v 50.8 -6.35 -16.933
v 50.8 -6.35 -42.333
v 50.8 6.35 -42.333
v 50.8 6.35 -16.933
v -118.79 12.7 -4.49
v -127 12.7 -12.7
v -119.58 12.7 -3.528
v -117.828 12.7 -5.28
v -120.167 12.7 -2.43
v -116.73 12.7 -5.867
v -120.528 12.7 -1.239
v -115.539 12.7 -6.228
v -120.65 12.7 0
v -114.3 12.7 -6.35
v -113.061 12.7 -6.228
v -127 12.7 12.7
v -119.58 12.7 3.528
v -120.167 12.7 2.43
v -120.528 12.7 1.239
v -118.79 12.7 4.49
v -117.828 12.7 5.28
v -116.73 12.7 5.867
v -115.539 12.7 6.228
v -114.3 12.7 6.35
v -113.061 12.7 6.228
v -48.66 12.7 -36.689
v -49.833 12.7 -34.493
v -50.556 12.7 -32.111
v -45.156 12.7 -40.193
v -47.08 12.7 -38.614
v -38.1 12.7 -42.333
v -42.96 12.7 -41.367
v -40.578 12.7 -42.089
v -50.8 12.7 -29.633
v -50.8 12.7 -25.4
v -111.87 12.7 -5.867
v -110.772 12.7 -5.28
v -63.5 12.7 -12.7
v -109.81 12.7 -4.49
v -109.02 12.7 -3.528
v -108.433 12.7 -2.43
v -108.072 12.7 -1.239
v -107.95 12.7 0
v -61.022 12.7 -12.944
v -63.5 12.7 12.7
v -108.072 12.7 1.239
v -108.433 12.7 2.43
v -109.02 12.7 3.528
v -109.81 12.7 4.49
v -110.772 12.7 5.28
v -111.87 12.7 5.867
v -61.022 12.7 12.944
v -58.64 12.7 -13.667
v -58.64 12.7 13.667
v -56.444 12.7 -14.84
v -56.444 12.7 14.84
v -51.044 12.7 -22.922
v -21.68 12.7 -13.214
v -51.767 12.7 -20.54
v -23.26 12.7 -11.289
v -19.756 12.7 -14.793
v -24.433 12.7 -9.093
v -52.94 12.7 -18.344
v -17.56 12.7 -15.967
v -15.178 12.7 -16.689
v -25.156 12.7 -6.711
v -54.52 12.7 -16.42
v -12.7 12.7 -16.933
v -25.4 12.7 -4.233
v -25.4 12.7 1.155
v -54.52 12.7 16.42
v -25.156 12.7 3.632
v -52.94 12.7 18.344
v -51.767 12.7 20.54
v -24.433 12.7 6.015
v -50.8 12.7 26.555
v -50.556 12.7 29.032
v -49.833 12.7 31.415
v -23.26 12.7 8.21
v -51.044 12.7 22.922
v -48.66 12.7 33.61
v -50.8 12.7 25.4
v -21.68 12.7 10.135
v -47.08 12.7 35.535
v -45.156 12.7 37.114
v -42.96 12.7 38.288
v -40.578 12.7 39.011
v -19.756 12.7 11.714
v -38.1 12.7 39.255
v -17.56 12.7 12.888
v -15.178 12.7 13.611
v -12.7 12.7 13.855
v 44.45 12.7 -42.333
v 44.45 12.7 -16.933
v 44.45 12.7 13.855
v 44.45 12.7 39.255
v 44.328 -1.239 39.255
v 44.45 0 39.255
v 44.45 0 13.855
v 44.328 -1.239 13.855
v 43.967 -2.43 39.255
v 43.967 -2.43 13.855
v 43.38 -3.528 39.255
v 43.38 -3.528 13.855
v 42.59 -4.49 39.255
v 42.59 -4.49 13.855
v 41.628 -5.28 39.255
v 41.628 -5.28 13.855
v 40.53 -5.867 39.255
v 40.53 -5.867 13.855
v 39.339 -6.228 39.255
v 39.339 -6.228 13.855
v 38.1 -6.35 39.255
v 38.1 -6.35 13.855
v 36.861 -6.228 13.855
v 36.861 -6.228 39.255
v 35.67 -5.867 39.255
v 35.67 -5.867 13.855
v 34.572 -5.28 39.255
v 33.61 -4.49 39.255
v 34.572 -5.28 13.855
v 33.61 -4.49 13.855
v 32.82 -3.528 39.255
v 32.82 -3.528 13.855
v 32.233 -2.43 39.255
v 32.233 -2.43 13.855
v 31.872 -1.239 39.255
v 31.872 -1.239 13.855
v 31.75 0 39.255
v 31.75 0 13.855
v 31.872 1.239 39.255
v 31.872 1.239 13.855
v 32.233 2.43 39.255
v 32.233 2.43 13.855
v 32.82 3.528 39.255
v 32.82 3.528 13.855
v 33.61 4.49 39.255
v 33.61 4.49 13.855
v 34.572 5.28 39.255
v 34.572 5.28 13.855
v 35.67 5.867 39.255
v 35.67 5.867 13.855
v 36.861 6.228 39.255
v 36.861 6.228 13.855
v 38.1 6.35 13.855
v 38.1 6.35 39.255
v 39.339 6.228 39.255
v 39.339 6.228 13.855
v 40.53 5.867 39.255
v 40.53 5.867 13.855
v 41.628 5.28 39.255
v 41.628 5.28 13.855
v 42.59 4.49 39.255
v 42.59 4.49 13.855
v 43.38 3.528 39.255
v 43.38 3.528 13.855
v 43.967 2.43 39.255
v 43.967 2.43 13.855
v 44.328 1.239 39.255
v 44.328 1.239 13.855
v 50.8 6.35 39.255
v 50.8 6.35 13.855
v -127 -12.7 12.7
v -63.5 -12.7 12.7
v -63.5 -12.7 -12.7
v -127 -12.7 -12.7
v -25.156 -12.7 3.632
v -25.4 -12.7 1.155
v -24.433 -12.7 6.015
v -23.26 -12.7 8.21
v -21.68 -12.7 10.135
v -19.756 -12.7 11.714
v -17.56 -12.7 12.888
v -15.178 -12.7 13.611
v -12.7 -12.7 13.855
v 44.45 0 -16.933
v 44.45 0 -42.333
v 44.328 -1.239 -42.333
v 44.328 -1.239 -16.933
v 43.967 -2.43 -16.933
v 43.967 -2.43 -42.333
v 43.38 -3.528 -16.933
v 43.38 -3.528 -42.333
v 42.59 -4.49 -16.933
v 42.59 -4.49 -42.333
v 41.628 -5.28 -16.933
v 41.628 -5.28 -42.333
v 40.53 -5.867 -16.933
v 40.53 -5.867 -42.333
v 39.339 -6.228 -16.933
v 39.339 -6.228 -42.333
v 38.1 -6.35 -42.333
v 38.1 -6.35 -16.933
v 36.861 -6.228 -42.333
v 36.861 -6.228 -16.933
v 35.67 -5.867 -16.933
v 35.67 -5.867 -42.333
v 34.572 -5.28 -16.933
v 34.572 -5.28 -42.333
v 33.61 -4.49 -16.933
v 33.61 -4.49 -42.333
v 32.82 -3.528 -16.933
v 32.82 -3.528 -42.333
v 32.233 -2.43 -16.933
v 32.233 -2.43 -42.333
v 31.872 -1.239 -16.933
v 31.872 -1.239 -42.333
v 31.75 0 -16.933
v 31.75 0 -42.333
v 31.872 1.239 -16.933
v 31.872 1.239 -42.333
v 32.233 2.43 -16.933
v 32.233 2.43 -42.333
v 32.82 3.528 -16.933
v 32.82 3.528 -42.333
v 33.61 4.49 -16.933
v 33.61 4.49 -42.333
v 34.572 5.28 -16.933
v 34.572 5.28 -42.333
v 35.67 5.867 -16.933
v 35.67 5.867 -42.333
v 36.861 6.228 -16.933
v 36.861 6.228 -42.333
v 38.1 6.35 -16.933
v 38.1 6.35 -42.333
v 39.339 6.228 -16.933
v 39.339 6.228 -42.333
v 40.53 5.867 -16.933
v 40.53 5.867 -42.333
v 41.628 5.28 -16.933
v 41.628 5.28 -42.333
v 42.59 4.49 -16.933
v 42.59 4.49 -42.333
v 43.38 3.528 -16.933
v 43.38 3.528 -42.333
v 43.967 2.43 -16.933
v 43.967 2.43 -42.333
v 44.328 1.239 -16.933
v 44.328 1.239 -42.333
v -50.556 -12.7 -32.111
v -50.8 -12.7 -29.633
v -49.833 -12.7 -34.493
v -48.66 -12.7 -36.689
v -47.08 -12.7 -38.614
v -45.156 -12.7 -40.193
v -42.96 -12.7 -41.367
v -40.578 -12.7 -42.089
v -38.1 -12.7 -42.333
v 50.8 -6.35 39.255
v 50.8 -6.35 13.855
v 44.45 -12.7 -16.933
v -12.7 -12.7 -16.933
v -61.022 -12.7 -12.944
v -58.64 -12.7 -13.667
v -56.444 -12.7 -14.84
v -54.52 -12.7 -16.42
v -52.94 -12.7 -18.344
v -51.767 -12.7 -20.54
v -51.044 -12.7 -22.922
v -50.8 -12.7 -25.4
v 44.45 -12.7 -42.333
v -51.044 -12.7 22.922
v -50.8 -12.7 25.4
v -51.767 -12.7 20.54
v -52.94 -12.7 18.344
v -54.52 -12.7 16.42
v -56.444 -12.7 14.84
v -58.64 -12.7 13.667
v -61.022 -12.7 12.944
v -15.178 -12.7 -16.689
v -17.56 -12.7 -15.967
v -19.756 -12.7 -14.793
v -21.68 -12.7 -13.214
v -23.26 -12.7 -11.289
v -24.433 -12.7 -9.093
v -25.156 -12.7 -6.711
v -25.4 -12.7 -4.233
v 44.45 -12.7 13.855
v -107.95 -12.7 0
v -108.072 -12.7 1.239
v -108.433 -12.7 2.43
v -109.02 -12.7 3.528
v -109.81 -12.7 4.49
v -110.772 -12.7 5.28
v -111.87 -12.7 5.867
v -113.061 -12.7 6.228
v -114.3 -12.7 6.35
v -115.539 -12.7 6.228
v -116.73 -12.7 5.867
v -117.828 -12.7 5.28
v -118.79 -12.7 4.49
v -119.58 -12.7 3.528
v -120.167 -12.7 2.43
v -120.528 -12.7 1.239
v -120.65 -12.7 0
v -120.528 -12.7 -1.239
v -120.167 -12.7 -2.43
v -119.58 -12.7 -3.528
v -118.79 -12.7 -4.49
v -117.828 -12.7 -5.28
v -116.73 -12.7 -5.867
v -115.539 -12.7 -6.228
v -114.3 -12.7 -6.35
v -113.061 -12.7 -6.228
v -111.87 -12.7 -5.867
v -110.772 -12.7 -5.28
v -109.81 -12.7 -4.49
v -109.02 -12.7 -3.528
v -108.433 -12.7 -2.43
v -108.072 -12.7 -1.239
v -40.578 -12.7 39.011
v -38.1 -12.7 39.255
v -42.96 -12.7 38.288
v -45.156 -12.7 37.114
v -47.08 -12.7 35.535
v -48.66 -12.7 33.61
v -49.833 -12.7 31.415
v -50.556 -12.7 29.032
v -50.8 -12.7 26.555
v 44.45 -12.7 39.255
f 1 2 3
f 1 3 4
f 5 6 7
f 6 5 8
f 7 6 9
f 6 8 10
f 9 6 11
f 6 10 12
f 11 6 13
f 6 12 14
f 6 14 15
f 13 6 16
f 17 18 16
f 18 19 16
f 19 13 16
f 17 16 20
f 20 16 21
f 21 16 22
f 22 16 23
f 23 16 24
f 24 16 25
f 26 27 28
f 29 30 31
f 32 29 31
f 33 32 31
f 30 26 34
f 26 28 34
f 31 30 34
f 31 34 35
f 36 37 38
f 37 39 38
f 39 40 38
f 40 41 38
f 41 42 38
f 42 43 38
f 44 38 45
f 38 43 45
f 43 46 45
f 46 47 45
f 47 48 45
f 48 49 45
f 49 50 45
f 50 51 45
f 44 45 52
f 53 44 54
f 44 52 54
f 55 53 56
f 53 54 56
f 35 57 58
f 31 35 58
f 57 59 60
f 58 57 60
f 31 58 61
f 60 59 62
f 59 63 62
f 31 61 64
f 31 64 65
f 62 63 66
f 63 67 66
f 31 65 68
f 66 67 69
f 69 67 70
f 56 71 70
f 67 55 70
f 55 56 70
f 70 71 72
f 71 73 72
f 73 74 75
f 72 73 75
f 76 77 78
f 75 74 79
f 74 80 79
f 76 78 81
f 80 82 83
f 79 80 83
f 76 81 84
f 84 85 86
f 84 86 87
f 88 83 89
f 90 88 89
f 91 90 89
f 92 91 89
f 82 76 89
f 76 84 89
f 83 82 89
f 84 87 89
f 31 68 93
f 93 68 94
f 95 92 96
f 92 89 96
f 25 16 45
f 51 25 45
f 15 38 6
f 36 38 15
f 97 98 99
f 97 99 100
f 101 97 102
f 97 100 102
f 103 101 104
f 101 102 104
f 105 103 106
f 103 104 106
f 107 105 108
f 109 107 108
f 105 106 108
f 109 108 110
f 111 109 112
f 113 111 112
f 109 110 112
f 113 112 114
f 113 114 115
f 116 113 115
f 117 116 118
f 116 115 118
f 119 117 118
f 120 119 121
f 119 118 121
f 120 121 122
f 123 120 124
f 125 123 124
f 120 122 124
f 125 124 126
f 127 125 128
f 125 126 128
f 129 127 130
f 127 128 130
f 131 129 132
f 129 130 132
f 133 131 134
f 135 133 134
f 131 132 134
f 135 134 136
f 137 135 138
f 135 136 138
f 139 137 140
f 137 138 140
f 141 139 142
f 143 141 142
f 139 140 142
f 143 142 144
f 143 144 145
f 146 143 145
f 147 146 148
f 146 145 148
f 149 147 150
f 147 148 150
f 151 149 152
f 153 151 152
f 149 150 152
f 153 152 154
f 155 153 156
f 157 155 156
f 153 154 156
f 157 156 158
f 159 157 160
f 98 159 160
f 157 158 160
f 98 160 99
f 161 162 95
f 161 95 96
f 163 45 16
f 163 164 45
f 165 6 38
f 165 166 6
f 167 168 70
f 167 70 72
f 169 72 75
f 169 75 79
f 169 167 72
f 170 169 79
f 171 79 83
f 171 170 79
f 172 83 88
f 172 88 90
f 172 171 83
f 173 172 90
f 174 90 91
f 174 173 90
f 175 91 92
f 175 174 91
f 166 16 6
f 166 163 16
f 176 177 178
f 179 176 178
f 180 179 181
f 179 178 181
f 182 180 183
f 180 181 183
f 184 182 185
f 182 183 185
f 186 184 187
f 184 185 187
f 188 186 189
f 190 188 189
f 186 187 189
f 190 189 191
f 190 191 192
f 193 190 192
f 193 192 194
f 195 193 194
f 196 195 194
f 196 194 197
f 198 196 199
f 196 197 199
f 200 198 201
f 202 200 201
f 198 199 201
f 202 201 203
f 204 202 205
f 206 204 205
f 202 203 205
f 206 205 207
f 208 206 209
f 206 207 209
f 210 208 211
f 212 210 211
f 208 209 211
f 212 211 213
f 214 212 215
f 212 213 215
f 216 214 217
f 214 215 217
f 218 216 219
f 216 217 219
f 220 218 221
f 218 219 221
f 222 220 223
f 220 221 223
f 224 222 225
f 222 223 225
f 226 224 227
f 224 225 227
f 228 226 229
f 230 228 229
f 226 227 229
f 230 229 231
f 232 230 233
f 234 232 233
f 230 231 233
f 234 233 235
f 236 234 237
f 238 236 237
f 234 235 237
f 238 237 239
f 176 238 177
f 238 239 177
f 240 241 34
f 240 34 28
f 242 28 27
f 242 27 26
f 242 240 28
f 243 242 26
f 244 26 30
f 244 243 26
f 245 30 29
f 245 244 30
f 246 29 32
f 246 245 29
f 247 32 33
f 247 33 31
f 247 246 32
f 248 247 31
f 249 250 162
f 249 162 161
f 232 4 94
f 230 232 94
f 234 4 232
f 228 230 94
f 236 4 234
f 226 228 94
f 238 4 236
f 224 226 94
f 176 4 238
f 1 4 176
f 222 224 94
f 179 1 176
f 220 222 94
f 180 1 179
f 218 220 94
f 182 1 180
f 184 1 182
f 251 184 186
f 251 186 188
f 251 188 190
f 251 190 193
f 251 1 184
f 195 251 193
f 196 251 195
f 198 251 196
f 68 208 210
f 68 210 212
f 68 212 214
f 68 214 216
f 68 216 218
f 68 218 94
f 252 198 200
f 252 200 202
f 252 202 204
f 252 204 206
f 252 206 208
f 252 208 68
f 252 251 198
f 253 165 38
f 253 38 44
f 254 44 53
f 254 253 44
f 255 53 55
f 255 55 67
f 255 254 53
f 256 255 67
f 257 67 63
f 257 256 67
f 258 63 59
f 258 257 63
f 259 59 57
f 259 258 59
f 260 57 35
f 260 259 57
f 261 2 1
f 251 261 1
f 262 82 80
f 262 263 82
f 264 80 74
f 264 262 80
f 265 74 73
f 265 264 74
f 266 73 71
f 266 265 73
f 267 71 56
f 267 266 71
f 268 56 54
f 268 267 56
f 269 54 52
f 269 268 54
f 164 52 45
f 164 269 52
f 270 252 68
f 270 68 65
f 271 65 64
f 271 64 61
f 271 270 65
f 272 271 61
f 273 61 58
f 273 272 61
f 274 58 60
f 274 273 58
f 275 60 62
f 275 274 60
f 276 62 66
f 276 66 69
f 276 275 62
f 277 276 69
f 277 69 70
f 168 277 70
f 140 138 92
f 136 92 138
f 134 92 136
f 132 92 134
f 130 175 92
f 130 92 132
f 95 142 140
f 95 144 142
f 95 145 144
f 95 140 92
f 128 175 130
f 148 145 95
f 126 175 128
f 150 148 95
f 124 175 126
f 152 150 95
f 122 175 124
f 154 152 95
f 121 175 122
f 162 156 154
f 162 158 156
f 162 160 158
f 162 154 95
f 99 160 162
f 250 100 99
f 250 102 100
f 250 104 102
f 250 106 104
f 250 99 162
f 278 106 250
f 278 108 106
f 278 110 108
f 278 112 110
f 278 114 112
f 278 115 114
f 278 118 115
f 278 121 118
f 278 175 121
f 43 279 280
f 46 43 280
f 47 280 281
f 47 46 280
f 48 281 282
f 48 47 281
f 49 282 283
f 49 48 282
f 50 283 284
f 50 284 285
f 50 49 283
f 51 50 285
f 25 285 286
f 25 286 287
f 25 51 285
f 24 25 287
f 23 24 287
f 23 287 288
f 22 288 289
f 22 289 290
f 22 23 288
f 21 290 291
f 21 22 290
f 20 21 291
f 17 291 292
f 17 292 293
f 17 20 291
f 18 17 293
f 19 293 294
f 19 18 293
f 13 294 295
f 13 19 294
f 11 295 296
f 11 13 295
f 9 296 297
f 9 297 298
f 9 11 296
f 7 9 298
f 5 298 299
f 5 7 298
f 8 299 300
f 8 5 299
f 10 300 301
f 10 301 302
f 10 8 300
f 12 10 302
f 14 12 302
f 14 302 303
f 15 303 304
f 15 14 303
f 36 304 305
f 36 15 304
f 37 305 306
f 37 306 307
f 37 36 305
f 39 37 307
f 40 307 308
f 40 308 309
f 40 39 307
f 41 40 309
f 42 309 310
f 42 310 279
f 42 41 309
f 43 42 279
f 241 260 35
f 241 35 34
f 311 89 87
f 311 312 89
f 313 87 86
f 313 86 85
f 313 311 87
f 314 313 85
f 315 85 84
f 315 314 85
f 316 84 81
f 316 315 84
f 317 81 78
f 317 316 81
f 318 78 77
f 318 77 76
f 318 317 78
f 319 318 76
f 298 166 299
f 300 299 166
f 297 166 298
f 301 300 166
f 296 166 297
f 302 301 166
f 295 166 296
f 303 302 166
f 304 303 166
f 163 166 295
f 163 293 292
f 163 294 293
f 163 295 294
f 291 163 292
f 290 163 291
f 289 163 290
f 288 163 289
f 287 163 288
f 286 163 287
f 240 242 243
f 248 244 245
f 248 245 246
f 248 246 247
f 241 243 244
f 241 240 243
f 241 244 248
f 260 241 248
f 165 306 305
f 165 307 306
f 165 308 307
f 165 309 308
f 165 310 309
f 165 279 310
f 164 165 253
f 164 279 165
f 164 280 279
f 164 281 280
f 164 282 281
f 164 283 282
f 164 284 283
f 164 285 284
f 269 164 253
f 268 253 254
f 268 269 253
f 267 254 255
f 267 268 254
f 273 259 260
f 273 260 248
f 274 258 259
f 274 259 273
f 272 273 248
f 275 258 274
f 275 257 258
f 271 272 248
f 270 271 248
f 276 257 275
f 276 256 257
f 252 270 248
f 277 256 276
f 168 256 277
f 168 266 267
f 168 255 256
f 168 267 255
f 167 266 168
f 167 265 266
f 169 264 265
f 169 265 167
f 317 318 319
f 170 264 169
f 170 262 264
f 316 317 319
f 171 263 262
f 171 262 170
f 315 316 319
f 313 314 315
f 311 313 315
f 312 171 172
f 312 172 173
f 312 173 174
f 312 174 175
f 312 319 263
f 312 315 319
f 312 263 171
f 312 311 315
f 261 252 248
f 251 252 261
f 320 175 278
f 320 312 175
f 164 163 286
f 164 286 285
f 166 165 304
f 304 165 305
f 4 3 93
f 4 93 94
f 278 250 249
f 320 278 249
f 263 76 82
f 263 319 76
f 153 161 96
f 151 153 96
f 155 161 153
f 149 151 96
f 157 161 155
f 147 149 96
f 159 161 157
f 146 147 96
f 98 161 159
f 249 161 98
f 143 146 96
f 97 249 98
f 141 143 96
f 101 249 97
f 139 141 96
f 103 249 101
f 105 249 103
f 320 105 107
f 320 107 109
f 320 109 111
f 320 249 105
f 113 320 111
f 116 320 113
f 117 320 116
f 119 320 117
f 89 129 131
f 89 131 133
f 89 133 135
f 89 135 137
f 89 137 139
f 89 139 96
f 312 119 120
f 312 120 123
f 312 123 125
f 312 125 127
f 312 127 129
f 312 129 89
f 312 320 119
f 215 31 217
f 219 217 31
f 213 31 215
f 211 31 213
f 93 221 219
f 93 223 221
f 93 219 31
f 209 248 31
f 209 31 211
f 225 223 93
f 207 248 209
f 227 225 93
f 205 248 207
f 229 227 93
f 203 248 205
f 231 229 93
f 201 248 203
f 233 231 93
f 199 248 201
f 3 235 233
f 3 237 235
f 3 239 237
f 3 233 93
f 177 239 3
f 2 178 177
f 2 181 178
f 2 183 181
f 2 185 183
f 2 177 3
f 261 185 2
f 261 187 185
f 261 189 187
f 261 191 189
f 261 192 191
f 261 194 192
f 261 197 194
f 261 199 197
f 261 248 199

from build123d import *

# Parameters (mm, degrees)
F0_R     = 6.35
F1_DEPTH = 12.7
F2_R     = 6.35
F3_DEPTH = 25.4
F4_R     = 6.35
F5_DEPTH = 25.4
F6_SIZE  = 6.35


# Not quite as in the source:
# - a feature names something its author has since deleted; it is built from what else it names


with BuildPart() as f1:
    # F0 (on Front) → F1 (new body, symmetric)
    with BuildSketch(Plane.XZ):
        with BuildLine():
            Line((-127, -12.7), (-63.5, -12.7))
            ThreePointArc((-63.5, -12.7), (-54.5197438789, -16.4197438789), (-50.8, -25.4))
            Line((-50.8, -25.4), (-50.8, -29.6333387181))
            ThreePointArc((-50.8, -29.6333387181), (-47.0802561211, -38.6135948391), (-38.1, -42.3333387181))
            Line((-38.1, -42.3333387181), (50.8, -42.3333387181))
            Line((50.8, -42.3333387181), (50.8, -16.9333387181))
            Line((50.8, -16.9333387181), (-12.7, -16.9333387181))
            ThreePointArc((-12.7, -16.9333387181), (-21.6802561211, -13.2135948391), (-25.4, -4.2333387181))
            Line((-25.4, -4.2333387181), (-25.4, 1.1545434965))
            ThreePointArc((-25.4, 1.1545434965), (-21.6802561211, 10.1347996175), (-12.7, 13.8545434965))
            Line((-12.7, 13.8545434965), (50.8, 13.8545434965))
            Line((50.8, 13.8545434965), (50.8, 39.2545434965))
            Line((50.8, 39.2545434965), (-38.1, 39.2545434965))
            ThreePointArc((-38.1, 39.2545434965), (-47.0802561211, 35.5347996175), (-50.8, 26.5545434965))
            Line((-50.8, 26.5545434965), (-50.8, 25.4))
            ThreePointArc((-50.8, 25.4), (-54.5197438789, 16.4197438789), (-63.5, 12.7))
            Line((-63.5, 12.7), (-127, 12.7))
            Line((-127, 12.7), (-127, -12.7))
        make_face()
        with Locations((-114.3, 0)):
            Circle(F0_R, mode=Mode.SUBTRACT)
    extrude(amount=F1_DEPTH, both=True)

    # F2 (on face) → F3 (cut)
    with BuildSketch(Plane(origin=(0, 0, 13.8545434965), x_dir=(1, 0, 0), z_dir=(0, 0, -1))):
        with Locations((38.1, 0)):
            Circle(F2_R)
    extrude(amount=-F3_DEPTH, mode=Mode.SUBTRACT)

    # F4 (on face) → F5 (cut)
    with BuildSketch(Plane(origin=(0, 0, -42.3333387181), x_dir=(1, 0, 0), z_dir=(0, 0, -1))):
        with Locations((38.1, 0)):
            Circle(F4_R)
    extrude(amount=-F5_DEPTH, mode=Mode.SUBTRACT)

    # F6
    f6_edges = [f1.edges().sort_by_distance(p)[0] for p in [
        (50.8, -12.7, -29.633339),
        (50.8, 12.7, -29.633339),
        (50.8, -12.7, 26.554543),
        (50.8, 12.7, 26.554543),
    ]]
    chamfer(f6_edges, length=F6_SIZE)


solid = f1.part
